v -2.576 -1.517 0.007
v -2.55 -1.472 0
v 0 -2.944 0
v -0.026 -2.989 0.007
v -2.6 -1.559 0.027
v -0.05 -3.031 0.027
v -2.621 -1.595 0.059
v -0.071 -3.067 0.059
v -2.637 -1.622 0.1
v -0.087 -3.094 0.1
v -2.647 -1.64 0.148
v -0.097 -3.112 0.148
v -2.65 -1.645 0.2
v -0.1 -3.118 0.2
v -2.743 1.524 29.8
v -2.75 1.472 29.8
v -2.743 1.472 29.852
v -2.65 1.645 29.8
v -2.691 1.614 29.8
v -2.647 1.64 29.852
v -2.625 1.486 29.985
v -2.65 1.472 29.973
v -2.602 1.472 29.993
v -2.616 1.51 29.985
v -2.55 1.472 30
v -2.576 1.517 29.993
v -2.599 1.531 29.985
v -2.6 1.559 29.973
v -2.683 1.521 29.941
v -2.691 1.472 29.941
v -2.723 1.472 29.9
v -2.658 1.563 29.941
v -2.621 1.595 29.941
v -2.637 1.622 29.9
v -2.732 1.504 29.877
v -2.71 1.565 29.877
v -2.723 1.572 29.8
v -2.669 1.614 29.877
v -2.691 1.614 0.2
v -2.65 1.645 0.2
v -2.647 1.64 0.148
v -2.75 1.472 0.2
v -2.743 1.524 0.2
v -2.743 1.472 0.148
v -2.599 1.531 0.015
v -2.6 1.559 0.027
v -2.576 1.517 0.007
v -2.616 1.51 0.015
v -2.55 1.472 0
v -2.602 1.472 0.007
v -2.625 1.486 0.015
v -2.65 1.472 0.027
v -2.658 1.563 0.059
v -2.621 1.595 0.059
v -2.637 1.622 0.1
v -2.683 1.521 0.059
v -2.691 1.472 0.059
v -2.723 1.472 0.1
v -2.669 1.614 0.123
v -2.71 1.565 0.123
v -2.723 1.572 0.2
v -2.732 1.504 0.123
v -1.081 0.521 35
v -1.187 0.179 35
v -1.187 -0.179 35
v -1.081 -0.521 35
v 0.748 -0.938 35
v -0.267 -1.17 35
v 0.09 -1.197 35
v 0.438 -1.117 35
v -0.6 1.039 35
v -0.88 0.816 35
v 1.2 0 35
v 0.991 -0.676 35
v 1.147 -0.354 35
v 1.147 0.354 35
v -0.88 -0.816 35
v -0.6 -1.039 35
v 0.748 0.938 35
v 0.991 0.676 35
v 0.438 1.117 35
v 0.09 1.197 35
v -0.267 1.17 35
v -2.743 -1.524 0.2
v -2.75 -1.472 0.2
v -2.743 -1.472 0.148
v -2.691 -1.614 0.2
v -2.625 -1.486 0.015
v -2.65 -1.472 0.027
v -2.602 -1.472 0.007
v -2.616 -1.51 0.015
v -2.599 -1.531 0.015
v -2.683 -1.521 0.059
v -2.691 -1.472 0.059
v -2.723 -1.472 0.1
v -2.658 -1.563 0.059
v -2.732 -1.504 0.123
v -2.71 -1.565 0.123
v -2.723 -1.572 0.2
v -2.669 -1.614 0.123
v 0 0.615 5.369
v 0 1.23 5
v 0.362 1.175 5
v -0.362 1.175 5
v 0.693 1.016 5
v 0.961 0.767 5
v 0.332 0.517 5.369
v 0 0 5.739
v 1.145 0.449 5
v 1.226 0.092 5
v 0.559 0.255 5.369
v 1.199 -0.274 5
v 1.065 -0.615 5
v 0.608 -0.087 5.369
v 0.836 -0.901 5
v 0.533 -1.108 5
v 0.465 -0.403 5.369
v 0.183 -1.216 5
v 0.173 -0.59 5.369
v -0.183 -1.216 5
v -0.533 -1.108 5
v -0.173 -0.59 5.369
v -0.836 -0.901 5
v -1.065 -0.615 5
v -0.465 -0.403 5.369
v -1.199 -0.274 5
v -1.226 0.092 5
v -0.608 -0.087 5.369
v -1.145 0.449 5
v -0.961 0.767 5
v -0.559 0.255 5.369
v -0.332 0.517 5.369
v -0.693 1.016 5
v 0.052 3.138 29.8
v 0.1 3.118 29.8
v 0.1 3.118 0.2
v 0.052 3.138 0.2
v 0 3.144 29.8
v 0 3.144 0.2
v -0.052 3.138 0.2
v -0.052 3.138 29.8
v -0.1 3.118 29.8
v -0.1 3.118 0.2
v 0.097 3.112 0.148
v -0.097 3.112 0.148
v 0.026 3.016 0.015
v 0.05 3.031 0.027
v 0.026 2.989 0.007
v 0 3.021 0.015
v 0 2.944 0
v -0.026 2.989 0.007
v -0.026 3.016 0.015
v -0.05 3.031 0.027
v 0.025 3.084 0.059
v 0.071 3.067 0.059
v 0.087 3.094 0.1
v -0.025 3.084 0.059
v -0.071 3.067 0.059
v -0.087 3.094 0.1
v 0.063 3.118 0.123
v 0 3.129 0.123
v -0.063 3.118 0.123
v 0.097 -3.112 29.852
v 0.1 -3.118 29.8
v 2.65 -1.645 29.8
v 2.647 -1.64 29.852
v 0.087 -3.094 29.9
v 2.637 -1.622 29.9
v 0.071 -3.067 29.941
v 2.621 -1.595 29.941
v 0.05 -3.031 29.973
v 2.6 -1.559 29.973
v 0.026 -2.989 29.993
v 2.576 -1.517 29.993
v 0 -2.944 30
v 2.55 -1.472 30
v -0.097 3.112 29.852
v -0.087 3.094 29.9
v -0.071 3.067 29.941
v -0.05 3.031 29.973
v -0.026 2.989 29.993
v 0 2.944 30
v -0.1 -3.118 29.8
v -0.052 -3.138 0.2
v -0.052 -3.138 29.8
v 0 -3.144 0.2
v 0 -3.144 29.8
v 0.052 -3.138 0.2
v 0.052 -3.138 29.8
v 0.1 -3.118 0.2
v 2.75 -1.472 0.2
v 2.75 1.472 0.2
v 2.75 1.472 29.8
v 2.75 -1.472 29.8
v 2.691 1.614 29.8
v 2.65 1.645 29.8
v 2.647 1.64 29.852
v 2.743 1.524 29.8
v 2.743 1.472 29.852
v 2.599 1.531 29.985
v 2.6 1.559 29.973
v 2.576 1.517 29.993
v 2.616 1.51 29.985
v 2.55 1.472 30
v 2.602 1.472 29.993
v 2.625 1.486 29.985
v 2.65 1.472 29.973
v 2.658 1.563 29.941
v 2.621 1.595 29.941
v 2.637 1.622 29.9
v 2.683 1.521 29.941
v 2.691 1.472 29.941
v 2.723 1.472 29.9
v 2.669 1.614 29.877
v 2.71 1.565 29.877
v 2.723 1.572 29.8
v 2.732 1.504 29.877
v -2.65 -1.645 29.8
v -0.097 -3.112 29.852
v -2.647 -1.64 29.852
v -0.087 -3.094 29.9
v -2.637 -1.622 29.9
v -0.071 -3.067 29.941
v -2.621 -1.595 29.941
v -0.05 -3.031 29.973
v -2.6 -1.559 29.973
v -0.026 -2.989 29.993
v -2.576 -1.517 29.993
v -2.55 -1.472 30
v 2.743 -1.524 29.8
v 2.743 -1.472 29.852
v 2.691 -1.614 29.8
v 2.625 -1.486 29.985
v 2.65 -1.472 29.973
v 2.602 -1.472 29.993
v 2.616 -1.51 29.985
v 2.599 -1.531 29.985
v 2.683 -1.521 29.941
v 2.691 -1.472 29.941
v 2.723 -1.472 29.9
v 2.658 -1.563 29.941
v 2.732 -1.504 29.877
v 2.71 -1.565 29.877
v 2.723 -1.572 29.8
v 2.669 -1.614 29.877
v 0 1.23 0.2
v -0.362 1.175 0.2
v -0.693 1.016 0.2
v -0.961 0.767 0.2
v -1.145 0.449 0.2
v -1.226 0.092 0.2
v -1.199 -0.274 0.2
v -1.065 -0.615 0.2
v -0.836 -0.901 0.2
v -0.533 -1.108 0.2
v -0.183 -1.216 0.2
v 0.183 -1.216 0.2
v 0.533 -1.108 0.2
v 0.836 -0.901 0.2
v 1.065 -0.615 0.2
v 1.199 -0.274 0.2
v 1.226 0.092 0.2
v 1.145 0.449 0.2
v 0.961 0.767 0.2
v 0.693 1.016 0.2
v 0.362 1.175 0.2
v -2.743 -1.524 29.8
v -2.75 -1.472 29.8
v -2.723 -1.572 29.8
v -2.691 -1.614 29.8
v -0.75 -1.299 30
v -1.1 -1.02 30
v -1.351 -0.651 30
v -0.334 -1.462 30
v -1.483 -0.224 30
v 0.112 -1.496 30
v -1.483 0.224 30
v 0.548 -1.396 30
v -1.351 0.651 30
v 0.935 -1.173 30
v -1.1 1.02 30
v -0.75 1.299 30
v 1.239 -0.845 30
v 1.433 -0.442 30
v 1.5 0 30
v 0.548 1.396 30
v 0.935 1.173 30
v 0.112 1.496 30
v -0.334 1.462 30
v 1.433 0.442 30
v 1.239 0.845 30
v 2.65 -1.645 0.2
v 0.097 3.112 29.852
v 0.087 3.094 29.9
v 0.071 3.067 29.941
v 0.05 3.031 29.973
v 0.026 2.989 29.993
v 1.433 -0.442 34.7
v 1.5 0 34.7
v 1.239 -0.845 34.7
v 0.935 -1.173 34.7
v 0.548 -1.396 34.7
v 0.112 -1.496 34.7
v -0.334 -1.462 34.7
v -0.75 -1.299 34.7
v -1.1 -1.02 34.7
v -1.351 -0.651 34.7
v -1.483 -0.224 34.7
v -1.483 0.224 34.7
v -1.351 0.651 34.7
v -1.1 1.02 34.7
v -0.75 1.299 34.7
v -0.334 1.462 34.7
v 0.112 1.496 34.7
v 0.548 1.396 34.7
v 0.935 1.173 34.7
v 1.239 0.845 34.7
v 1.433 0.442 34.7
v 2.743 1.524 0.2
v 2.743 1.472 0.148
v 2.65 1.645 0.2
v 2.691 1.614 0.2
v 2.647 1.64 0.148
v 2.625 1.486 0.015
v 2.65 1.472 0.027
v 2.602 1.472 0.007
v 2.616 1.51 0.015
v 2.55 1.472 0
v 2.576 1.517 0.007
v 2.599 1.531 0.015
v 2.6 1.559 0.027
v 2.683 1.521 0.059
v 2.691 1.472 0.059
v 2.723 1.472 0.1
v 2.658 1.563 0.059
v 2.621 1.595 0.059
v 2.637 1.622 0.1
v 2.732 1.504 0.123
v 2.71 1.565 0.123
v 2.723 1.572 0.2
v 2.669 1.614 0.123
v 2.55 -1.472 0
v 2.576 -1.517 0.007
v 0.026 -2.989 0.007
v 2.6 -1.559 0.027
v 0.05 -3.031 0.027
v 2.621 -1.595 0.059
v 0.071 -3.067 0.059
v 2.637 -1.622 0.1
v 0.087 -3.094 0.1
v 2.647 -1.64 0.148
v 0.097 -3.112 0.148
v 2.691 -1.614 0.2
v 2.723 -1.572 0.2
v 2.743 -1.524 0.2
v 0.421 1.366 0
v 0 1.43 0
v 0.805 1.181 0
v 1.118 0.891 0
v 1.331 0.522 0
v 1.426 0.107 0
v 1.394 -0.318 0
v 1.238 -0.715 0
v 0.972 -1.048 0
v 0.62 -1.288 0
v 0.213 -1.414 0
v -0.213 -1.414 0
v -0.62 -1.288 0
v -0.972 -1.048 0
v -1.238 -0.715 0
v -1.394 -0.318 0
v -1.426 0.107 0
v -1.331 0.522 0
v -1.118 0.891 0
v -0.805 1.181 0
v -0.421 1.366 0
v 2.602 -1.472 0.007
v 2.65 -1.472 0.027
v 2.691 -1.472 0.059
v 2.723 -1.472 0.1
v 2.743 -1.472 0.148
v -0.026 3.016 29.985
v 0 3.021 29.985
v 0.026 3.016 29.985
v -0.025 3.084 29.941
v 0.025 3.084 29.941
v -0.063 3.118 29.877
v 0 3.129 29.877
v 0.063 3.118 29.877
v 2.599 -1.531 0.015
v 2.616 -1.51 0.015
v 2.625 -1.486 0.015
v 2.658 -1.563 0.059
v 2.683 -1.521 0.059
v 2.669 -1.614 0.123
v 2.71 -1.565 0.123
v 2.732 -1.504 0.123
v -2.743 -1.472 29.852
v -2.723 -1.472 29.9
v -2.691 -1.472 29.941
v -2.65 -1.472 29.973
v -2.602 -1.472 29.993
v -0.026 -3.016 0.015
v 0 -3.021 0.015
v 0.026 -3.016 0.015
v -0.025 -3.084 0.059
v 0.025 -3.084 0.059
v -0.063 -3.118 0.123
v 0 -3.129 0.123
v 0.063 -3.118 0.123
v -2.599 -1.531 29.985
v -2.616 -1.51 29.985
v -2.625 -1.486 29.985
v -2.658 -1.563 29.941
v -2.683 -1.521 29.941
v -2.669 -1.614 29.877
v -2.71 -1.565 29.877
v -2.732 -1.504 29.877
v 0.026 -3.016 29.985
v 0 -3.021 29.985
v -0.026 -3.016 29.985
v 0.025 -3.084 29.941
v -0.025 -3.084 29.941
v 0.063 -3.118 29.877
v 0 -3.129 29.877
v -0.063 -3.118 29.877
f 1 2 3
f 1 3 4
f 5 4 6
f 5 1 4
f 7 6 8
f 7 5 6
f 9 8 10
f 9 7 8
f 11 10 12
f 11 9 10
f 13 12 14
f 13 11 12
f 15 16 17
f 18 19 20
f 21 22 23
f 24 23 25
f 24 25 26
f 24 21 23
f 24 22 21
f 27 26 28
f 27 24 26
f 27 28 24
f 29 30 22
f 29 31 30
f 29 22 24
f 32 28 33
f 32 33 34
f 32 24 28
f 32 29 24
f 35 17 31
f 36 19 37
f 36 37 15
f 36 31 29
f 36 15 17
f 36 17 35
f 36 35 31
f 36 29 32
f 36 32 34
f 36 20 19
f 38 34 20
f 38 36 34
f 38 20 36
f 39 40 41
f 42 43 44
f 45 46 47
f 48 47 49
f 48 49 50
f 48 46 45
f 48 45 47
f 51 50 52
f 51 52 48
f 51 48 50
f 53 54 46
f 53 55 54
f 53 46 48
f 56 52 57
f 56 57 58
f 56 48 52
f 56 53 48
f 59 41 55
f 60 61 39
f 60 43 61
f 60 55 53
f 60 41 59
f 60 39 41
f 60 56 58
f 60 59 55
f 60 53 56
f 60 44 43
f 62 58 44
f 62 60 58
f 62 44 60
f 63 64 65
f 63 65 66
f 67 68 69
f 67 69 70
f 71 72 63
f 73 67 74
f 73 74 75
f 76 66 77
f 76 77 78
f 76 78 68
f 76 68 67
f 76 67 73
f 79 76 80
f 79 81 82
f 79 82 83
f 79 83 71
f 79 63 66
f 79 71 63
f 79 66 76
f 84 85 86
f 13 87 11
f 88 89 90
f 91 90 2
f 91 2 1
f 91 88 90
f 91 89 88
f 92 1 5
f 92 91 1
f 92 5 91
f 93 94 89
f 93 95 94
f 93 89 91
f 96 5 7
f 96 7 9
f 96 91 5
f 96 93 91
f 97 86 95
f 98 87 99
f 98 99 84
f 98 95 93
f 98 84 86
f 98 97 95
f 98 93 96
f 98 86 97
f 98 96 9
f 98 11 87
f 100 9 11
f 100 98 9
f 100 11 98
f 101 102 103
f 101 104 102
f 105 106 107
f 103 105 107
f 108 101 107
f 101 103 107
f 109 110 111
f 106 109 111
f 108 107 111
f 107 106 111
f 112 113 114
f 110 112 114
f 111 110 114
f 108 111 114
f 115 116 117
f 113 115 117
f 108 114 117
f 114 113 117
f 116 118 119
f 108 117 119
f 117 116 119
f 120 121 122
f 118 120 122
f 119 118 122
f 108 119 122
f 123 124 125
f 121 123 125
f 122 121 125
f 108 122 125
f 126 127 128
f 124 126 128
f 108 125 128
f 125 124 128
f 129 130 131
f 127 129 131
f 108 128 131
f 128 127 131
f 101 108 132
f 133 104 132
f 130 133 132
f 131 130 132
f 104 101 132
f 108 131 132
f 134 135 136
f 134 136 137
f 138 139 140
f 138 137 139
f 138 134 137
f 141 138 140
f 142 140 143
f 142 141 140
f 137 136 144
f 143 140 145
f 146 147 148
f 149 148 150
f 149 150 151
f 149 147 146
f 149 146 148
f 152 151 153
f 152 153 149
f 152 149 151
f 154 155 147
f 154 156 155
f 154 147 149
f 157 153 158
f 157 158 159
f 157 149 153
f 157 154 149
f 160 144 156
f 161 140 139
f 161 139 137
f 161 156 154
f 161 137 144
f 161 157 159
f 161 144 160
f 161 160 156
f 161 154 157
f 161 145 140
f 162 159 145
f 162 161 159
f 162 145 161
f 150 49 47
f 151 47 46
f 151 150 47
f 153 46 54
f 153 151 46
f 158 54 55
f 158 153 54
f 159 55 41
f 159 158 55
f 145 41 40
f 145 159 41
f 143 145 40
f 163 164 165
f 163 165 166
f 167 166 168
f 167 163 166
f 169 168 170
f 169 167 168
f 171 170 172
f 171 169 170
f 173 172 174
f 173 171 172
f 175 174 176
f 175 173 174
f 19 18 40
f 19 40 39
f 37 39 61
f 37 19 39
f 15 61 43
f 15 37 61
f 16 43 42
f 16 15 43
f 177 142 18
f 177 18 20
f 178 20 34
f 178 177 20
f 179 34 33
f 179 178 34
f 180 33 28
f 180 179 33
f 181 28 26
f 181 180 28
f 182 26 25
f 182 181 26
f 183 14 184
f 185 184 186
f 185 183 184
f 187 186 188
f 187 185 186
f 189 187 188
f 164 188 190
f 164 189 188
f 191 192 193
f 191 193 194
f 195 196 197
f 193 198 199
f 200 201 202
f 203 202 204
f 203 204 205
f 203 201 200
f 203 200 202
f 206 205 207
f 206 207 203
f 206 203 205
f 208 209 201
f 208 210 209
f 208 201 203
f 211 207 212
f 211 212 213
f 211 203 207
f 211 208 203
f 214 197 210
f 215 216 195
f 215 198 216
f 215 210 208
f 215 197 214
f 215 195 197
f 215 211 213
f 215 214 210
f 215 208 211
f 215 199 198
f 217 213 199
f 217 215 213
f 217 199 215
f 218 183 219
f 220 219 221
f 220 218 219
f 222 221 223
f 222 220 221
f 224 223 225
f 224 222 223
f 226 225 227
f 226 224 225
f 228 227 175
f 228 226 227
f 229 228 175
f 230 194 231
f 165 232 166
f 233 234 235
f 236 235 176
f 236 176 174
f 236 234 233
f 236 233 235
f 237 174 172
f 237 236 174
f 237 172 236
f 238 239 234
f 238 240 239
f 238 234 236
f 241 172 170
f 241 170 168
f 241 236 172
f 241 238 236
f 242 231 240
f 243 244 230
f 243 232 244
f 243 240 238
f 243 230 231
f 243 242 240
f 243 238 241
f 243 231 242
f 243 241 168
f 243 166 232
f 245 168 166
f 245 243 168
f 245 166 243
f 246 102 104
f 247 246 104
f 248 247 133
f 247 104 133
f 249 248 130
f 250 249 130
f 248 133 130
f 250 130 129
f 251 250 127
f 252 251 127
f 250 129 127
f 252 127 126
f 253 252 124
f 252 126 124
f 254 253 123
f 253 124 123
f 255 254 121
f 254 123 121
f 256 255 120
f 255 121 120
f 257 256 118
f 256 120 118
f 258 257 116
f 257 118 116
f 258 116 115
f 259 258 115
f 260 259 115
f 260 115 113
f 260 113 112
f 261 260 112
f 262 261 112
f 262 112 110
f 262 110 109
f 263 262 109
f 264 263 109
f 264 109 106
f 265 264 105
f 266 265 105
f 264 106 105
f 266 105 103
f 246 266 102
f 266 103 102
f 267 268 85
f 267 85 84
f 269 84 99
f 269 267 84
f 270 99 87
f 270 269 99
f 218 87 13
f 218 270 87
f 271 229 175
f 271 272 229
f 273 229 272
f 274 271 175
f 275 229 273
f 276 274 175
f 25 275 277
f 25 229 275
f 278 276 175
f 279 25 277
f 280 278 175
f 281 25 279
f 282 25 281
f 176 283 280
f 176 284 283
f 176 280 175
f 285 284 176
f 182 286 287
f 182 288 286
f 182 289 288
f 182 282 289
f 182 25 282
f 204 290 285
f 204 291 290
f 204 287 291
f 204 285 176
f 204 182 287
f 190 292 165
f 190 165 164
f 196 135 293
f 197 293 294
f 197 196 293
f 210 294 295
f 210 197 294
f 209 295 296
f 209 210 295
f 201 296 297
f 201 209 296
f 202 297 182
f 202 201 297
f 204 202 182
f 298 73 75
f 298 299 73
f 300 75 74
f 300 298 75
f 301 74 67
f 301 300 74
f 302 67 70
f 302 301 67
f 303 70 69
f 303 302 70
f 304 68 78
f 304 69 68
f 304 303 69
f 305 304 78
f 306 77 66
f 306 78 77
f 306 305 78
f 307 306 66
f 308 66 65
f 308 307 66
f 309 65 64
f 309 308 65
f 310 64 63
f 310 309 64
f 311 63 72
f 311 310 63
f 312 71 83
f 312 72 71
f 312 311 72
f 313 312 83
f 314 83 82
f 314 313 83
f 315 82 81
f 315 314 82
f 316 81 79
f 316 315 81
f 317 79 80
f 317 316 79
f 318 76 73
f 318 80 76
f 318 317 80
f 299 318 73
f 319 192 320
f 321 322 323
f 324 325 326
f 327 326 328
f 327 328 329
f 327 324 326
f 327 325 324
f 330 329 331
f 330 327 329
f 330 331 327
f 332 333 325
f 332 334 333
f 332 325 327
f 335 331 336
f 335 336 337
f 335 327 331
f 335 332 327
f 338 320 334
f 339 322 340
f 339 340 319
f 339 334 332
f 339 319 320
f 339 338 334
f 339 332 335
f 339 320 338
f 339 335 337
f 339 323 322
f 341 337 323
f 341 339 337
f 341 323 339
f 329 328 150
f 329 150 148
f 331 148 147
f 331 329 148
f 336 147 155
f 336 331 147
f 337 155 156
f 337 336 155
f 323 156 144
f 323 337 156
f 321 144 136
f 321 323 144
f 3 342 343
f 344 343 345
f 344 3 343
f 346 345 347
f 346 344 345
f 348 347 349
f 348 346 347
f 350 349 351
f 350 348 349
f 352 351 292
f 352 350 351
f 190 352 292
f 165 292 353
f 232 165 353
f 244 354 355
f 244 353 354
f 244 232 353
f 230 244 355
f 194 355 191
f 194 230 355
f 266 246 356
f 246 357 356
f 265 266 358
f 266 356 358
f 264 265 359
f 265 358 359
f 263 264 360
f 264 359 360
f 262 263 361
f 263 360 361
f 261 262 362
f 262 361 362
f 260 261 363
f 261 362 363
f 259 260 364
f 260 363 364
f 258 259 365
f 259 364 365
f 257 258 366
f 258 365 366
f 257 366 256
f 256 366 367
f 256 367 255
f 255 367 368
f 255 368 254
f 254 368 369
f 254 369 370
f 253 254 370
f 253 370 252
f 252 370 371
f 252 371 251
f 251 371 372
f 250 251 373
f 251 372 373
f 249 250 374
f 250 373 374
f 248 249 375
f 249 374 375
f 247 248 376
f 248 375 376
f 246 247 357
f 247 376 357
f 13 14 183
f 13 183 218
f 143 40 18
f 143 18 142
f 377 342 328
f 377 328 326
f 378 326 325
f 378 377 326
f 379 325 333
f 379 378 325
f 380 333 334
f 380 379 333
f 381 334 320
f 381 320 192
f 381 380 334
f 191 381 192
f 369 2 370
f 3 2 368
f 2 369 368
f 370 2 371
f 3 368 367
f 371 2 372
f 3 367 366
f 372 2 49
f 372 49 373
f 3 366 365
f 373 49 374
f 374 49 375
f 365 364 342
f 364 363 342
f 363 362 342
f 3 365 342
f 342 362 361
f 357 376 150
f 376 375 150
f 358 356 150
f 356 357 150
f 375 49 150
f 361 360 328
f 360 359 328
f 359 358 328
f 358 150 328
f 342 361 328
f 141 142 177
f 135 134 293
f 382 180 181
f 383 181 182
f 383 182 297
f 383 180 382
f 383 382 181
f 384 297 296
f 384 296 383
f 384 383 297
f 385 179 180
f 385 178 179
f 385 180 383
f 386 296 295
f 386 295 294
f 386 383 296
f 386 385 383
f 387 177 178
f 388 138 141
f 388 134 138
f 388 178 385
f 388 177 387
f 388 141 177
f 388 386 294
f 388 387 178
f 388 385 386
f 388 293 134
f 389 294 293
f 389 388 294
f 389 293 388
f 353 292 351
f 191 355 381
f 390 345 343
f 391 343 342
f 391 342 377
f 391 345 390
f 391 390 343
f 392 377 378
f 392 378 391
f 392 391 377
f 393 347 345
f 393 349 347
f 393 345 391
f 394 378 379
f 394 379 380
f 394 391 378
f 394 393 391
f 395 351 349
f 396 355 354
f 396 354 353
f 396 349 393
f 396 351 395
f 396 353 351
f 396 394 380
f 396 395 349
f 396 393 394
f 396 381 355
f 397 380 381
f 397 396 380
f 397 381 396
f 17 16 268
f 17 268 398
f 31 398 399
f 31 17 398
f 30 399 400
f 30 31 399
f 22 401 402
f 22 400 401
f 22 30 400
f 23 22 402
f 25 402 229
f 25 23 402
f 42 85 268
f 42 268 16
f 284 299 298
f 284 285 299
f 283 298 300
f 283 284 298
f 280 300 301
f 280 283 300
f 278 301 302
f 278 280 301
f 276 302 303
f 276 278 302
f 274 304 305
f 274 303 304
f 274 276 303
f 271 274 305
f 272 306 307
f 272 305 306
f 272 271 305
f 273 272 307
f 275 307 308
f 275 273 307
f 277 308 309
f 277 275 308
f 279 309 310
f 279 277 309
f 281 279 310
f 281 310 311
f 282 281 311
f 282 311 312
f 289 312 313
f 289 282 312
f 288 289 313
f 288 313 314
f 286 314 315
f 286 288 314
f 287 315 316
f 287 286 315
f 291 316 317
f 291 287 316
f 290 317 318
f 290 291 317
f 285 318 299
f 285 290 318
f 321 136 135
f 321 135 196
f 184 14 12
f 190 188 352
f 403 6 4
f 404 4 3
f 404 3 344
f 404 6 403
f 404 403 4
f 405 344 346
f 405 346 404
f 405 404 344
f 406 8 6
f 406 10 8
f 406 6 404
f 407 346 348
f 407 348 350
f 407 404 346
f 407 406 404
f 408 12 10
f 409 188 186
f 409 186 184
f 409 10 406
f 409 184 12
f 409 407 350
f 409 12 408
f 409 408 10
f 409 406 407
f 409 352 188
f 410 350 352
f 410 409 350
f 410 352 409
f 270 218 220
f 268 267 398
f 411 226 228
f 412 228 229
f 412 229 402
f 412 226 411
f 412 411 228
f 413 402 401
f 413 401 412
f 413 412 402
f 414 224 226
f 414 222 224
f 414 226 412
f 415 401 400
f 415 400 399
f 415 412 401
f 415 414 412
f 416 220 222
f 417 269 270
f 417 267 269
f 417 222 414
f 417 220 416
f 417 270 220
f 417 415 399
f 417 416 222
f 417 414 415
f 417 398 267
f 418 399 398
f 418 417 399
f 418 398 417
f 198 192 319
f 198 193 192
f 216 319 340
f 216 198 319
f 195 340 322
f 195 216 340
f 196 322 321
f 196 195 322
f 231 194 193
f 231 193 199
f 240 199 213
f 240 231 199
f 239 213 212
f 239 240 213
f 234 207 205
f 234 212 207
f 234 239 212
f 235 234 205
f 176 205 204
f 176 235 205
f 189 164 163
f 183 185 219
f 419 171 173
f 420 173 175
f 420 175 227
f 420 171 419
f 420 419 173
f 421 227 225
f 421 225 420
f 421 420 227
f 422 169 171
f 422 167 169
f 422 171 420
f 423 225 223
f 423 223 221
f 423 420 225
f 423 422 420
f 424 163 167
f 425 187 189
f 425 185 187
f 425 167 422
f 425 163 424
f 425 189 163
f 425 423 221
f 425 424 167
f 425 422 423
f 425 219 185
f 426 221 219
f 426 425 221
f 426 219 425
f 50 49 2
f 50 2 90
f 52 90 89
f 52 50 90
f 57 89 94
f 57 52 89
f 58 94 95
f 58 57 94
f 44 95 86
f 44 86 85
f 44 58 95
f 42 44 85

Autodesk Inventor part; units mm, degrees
ref_plane "YZ Plane" through (0, 0, 0) normal (1, 0, 0) x (0, 1, 0)
ref_plane "XZ Plane" through (0, 0, 0) normal (0, 1, 0) x (-1, 0, 0)
ref_plane "XY Plane" through (0, 0, 0) normal (0, 0, 1) x (1, 0, 0)
sketch "スケッチ1" plane through (0, 0, 0) normal (0, 0, 1) x (1, 0, 0)
  line L0 (0, 3.1754) -> (2.75, 1.5877)
  line L1 (2.75, 1.5877) -> (2.75, -1.5877)
  line L2 (2.75, -1.5877) -> (0, -3.1754)
  line L3 (0, -3.1754) -> (-2.75, -1.5877)
  line L4 (-2.75, -1.5877) -> (-2.75, 1.5877)
  line L5 (-2.75, 1.5877) -> (0, 3.1754)
  point P0 (0, 0)
  point P1 (0, 0)
  dimension "d0" = 5.5
extrude "押し出し1" add sketch "スケッチ1" along normal blind 30
sketch "スケッチ2" plane through (0, 0, 30) normal (0, 0, 1) x (1, 0, 0)
  circle A0 centre (0, 0) radius 1.5
  dimension "d3" = 3
extrude "押し出し2" add sketch "スケッチ2" along normal blind 5
thread "ねじ1" size "M3x0.5" class "6g" standard "ANSI Metric M Profile" length 12
chamfer "面取り1" distance 0.3 angle 45 1 edges at (-1.5, 0, 35)
fillet "フィレット1" radius 0.2 18 edges at (-1.375, 2.3816, 30) (1.375, 2.3816, 30) (2.75, 0, 30) (1.375, -2.3816, 30) (-1.375, -2.3816, 30) (-2.75, 0, 30) (-2.75, -1.5877, 15) (0, -3.1754, 15) (2.75, -1.5877, 15) (2.75, 1.5877, 15) (0, 3.1754, 15) (-2.75, 1.5877, 15) (-1.375, 2.3816, 0) (1.375, 2.3816, 0) (2.75, 0, 0) (1.375, -2.3816, 0) (-1.375, -2.3816, 0) (-2.75, 0, 0)
sketch "スケッチ3" plane through (0, 0, 0) normal (0, 0, -1) x (-1, 0, 0)
  point P0 (0, 0)
hole "穴1" at (0, 0, 0) direction (0, 0, 1) diameter 2.459 depth 5 tip angle 118 thread size "M3x0.5" class "6H" standard "ANSI Metric M Profile"
chamfer "面取り2" distance 0.2 angle 45 1 edges at (0, -1.2295, 0)
properties part number "hexagonal_spacer_M3_30mm" material "鋼、炭素鋼"
